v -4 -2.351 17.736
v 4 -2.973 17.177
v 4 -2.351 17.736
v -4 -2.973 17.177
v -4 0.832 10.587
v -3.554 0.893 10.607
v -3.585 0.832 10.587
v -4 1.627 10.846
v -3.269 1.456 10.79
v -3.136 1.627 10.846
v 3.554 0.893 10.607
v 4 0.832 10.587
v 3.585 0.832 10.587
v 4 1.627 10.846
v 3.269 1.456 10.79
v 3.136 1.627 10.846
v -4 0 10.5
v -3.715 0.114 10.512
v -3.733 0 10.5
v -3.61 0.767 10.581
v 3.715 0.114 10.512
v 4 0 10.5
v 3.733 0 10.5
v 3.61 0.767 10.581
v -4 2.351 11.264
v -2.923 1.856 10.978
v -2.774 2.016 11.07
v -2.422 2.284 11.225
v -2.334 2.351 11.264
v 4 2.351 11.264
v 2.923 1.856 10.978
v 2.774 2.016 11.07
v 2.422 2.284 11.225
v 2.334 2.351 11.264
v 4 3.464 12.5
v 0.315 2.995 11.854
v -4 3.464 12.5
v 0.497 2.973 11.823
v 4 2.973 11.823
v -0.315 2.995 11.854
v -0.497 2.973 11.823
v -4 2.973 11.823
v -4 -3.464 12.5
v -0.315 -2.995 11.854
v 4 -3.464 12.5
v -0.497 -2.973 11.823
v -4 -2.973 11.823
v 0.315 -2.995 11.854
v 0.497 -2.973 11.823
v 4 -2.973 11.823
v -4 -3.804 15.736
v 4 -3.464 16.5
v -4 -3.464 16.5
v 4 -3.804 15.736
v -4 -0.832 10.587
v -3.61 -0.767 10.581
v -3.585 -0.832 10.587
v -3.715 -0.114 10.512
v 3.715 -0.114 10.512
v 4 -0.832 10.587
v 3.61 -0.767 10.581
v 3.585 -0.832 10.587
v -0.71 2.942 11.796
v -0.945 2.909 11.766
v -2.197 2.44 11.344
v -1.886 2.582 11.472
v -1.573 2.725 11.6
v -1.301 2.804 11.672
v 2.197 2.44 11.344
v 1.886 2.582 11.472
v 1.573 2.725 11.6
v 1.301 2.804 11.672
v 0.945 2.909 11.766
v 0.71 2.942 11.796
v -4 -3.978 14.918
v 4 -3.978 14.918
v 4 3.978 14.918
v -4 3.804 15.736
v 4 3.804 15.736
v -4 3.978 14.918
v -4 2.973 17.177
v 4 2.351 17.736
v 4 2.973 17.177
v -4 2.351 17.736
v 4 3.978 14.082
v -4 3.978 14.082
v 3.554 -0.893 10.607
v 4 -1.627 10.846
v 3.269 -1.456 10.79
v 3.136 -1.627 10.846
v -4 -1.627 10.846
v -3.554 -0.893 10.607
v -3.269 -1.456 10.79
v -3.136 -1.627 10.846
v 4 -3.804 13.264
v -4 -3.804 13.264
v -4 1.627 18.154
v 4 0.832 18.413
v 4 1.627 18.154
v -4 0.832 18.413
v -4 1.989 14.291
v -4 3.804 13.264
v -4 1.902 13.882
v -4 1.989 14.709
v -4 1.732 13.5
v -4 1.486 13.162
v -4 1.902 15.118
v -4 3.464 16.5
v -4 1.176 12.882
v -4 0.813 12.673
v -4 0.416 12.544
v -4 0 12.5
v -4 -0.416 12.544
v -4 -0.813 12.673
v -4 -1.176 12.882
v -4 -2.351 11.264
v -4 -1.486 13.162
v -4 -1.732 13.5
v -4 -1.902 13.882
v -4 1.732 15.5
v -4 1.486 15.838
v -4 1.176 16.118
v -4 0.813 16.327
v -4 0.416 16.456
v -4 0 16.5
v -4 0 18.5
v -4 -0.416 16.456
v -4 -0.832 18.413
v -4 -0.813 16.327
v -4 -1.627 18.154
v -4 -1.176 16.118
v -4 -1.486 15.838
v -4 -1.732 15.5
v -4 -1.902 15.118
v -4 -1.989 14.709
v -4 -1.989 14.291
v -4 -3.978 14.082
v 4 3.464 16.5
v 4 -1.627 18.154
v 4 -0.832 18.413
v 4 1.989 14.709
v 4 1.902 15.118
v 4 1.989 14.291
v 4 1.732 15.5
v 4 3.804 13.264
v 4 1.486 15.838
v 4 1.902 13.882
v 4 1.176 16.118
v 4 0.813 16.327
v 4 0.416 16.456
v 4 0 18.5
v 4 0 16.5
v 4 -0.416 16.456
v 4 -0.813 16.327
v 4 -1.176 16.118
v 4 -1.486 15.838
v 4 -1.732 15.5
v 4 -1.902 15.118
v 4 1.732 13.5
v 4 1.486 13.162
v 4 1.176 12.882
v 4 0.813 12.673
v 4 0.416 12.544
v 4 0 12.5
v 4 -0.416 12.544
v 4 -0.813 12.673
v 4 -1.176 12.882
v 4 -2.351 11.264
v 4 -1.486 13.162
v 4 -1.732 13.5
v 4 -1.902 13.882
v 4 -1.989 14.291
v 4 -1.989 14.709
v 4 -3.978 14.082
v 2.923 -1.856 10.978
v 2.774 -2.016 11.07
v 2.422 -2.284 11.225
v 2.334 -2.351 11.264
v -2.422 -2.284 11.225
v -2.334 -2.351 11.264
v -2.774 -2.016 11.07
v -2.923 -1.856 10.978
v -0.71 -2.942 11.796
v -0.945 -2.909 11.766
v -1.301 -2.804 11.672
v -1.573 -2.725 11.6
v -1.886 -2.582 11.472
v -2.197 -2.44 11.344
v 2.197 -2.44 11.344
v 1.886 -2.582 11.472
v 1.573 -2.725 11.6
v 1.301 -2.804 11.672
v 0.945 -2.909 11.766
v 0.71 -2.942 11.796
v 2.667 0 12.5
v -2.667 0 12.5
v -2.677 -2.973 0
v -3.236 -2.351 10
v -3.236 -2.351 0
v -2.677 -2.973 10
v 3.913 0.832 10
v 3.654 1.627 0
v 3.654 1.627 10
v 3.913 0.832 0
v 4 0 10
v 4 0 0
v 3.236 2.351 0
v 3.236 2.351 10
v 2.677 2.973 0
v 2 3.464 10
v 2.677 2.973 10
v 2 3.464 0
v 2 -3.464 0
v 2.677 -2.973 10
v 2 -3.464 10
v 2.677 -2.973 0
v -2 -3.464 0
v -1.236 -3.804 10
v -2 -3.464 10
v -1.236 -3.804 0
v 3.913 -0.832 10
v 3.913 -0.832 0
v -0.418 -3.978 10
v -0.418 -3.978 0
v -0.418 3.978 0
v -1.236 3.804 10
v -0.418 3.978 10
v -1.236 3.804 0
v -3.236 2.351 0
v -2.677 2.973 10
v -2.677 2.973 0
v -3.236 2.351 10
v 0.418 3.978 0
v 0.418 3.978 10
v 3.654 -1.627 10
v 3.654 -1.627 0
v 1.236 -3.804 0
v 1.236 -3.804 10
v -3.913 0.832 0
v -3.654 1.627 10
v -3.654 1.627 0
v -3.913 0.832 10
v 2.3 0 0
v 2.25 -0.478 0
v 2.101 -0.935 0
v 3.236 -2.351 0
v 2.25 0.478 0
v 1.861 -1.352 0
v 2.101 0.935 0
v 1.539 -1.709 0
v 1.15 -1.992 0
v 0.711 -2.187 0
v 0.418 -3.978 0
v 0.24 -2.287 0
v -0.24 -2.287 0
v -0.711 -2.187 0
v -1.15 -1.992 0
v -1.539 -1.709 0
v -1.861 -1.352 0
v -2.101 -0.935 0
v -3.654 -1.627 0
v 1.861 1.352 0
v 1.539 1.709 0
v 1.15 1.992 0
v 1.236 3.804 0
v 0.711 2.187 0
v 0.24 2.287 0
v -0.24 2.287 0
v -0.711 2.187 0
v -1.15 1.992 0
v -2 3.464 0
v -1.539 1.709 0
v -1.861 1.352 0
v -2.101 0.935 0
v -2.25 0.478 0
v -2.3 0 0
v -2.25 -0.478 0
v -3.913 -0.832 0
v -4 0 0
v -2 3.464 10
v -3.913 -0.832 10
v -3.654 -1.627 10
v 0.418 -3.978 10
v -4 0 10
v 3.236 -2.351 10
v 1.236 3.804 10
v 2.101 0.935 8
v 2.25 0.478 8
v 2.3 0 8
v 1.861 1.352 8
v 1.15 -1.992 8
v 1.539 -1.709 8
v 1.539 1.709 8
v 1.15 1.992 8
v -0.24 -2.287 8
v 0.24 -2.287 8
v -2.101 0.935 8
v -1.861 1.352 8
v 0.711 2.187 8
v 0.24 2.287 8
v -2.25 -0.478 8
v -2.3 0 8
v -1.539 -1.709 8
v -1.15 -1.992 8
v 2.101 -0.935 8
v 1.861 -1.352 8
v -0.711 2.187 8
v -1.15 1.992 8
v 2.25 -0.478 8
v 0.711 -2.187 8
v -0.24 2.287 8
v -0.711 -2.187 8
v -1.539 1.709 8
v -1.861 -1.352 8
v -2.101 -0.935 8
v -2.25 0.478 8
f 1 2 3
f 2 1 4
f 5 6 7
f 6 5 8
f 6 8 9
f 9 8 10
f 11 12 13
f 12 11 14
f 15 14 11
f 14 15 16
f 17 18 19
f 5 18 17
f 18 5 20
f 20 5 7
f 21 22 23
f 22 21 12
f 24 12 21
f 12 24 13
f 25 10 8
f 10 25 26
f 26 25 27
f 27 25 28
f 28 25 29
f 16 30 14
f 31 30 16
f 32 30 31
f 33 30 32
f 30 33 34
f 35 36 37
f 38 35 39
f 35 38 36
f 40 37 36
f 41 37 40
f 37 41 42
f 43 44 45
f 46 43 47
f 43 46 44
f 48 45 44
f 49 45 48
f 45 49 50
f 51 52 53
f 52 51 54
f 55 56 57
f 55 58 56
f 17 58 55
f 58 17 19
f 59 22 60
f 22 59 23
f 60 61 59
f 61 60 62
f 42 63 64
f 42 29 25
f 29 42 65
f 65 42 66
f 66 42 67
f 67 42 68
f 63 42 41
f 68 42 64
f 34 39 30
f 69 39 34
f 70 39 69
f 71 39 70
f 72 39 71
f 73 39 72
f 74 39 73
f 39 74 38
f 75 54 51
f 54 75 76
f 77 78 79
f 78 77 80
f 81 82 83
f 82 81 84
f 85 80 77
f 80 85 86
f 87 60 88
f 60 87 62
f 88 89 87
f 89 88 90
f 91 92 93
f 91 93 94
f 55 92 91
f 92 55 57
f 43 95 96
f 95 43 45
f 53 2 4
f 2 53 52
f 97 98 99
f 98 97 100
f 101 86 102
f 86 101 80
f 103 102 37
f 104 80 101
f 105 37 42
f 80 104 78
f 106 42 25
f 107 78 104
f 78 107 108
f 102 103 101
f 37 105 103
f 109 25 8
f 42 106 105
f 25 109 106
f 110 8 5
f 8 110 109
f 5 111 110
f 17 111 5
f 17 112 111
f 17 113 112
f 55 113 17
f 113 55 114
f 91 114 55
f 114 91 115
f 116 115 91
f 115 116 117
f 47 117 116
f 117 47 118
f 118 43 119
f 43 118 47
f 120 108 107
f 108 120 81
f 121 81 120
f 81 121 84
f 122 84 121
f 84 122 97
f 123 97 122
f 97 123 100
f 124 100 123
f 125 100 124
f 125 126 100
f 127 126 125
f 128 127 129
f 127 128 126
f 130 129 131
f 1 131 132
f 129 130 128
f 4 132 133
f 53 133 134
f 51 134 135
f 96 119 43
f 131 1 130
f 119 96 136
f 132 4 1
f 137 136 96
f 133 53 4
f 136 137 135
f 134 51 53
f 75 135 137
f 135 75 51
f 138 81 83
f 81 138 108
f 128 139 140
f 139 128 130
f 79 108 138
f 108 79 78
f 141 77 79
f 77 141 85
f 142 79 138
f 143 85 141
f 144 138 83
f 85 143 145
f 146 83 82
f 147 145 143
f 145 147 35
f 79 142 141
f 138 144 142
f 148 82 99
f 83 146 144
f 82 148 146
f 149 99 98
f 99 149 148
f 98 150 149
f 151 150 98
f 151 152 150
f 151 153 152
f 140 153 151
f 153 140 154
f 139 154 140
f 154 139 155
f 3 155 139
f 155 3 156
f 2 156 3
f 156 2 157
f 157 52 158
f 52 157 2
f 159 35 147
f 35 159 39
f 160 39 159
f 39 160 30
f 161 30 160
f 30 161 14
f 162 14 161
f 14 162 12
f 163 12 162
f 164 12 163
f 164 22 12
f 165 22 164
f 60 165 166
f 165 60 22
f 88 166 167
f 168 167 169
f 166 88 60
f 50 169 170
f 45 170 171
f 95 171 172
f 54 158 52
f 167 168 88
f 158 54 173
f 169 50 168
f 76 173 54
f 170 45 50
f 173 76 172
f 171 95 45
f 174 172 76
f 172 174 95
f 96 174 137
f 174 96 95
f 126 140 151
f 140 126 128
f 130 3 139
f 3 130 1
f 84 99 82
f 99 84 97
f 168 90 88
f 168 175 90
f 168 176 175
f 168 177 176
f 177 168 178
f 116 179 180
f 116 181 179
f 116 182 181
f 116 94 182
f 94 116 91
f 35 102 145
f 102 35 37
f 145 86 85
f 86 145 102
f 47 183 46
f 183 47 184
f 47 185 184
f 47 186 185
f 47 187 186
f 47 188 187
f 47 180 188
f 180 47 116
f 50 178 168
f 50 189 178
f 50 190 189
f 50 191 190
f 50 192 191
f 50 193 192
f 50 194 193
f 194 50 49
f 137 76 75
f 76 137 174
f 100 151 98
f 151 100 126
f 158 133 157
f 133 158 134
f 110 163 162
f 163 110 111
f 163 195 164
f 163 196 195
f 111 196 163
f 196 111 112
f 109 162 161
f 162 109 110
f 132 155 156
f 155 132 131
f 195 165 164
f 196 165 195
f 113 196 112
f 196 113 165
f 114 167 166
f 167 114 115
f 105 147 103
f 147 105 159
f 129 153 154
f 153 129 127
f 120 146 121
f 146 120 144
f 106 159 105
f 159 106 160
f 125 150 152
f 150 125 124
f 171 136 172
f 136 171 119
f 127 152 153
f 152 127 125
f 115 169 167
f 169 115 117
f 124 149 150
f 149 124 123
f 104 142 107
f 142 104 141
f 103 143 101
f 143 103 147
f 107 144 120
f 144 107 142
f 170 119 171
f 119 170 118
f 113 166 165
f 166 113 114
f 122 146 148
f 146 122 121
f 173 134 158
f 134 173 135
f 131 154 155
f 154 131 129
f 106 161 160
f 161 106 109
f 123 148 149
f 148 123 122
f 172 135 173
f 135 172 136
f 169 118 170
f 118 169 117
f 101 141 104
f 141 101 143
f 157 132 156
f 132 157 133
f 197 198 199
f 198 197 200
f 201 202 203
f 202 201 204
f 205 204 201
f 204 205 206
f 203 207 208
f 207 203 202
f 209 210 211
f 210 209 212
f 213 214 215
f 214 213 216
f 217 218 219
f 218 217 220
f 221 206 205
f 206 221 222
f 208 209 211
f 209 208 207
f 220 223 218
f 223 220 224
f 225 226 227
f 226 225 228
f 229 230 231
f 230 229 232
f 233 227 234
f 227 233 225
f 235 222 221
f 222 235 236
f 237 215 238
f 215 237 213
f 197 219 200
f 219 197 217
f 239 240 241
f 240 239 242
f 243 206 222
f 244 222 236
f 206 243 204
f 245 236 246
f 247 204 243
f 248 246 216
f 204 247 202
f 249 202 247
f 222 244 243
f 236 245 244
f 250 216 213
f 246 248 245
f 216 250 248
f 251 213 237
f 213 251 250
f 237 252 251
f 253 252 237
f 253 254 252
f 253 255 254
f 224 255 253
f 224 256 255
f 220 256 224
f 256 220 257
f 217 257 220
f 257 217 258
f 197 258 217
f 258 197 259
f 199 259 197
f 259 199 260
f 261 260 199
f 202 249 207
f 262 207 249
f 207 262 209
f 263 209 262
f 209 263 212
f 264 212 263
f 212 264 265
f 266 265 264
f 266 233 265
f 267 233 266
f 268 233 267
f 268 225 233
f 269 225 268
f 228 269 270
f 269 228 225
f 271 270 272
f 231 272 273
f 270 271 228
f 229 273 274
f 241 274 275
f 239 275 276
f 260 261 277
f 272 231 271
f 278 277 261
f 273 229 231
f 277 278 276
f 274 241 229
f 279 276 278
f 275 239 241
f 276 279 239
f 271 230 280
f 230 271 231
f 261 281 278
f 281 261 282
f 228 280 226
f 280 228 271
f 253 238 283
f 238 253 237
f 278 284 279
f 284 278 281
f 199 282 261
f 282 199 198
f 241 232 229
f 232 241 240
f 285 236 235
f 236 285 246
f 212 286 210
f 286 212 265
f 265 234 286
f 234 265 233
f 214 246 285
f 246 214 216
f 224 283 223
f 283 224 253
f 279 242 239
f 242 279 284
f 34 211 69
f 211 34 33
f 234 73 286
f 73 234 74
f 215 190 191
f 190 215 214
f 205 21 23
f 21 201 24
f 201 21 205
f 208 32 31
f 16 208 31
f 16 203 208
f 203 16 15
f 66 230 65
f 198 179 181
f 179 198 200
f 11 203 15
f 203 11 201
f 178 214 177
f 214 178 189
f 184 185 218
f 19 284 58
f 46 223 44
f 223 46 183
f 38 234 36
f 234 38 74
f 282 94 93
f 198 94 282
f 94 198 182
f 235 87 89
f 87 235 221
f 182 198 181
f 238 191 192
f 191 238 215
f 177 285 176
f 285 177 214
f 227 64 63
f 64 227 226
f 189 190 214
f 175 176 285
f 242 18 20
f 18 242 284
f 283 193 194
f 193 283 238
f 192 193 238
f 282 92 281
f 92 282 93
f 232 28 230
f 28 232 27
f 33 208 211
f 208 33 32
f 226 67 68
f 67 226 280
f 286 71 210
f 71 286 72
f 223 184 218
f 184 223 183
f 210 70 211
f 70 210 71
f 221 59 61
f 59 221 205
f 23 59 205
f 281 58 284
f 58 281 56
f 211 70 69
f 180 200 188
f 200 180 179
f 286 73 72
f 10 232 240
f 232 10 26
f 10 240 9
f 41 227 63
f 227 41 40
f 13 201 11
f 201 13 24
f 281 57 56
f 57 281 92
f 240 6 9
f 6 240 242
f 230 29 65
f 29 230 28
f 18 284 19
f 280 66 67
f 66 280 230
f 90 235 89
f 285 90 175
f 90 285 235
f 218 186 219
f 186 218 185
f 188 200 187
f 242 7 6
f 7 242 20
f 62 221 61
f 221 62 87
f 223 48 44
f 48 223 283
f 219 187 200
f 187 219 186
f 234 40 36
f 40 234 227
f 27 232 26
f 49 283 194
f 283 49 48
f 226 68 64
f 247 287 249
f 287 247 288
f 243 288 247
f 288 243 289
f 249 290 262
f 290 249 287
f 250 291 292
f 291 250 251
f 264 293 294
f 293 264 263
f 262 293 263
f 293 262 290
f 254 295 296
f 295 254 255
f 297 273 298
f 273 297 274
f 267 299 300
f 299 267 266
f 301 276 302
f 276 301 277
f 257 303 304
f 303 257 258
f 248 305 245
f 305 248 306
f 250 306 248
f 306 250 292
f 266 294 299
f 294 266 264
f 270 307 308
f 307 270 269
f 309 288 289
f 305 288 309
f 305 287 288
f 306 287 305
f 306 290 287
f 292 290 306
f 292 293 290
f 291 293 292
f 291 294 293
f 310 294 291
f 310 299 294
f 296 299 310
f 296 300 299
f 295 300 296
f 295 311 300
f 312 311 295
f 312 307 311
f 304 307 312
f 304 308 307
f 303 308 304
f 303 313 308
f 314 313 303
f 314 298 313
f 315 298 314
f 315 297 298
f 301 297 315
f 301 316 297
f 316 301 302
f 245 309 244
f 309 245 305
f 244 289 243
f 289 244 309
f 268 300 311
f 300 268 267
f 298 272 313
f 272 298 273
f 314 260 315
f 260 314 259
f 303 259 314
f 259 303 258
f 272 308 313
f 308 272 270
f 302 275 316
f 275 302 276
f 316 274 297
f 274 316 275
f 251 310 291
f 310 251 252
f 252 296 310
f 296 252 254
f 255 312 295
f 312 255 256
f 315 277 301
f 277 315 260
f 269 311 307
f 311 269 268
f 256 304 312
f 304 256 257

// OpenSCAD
$fn=30;

//BEGIN CUSTOMIZER VARIABLES  
/*[Base Setup]*/
//Set tolarance for tightness.  .3 is a good start, bigger the number looser.
RodTolerance = .3;
//in MM.   Radius of connecting rod.
RodRadius = 2;
//in MM.   Socket base height.
RodSocketHeight = 10;
//Depth as a percentage deep for the rod hole. 
RodDepthPercent = .80;  //[.10:.10:.90]
//in MM.   
RodSocketWallThickness = 2;

/*[Eye Hole Setup]*/
//Angle of Eye Hole.  90 is straght up.
EyeAngle = 90;  //[45:5:90]
//in MM.  Center hole radius.
EyeHoleRadius = 2;
//in MM.  Depth of wall around center hole.
EyeWallThickness = 2;
//in MM.  Offset of 0 is a good start.  Lets you slide around the eye.  Used mostly for angled eyes.
EyeOffsetX = 0;
//in MM (up/dn).  Offset of 0 is a good start.  Lets you slide around the eye. Used mostly for angled eyes.
EyeOffsetZ = 0;
/*[Extras]*/
//END CUSTOMIZER VARIABLES


module eye() {
  cAngleOffset = ((90 - EyeAngle)* .06)+EyeOffsetZ;
  echo("cAngleOffset = ", cAngleOffset);
    
  cEyeHeight = ((RodSocketHeight+RodSocketHeight*.25)+EyeWallThickness)-cAngleOffset;
    
  cylinder(h=RodSocketHeight,r=RodRadius+RodSocketWallThickness);
  translate([0,0,RodSocketHeight]) {
    cylinder(h=RodSocketHeight*.25,r1=RodRadius+RodSocketWallThickness, r2=(RodRadius+RodSocketWallThickness)/1.5);
  }

//   translate([-5,0,14]) {
  translate([((RodSocketWallThickness+RodRadius)*-1)+EyeOffsetX,0,cEyeHeight]) {
    rotate(a=EyeAngle, v=[0,1,0]) {
        difference() {
          cylinder(h=(RodRadius+RodSocketWallThickness)*2,r=EyeHoleRadius+EyeWallThickness);
          cylinder(h=(RodRadius+RodSocketWallThickness)*2,r=EyeHoleRadius);
        }
    }
  }
}


difference() {
  eye();
  cylinder(h=RodSocketHeight*RodDepthPercent,r=RodRadius+RodTolerance);  
}
